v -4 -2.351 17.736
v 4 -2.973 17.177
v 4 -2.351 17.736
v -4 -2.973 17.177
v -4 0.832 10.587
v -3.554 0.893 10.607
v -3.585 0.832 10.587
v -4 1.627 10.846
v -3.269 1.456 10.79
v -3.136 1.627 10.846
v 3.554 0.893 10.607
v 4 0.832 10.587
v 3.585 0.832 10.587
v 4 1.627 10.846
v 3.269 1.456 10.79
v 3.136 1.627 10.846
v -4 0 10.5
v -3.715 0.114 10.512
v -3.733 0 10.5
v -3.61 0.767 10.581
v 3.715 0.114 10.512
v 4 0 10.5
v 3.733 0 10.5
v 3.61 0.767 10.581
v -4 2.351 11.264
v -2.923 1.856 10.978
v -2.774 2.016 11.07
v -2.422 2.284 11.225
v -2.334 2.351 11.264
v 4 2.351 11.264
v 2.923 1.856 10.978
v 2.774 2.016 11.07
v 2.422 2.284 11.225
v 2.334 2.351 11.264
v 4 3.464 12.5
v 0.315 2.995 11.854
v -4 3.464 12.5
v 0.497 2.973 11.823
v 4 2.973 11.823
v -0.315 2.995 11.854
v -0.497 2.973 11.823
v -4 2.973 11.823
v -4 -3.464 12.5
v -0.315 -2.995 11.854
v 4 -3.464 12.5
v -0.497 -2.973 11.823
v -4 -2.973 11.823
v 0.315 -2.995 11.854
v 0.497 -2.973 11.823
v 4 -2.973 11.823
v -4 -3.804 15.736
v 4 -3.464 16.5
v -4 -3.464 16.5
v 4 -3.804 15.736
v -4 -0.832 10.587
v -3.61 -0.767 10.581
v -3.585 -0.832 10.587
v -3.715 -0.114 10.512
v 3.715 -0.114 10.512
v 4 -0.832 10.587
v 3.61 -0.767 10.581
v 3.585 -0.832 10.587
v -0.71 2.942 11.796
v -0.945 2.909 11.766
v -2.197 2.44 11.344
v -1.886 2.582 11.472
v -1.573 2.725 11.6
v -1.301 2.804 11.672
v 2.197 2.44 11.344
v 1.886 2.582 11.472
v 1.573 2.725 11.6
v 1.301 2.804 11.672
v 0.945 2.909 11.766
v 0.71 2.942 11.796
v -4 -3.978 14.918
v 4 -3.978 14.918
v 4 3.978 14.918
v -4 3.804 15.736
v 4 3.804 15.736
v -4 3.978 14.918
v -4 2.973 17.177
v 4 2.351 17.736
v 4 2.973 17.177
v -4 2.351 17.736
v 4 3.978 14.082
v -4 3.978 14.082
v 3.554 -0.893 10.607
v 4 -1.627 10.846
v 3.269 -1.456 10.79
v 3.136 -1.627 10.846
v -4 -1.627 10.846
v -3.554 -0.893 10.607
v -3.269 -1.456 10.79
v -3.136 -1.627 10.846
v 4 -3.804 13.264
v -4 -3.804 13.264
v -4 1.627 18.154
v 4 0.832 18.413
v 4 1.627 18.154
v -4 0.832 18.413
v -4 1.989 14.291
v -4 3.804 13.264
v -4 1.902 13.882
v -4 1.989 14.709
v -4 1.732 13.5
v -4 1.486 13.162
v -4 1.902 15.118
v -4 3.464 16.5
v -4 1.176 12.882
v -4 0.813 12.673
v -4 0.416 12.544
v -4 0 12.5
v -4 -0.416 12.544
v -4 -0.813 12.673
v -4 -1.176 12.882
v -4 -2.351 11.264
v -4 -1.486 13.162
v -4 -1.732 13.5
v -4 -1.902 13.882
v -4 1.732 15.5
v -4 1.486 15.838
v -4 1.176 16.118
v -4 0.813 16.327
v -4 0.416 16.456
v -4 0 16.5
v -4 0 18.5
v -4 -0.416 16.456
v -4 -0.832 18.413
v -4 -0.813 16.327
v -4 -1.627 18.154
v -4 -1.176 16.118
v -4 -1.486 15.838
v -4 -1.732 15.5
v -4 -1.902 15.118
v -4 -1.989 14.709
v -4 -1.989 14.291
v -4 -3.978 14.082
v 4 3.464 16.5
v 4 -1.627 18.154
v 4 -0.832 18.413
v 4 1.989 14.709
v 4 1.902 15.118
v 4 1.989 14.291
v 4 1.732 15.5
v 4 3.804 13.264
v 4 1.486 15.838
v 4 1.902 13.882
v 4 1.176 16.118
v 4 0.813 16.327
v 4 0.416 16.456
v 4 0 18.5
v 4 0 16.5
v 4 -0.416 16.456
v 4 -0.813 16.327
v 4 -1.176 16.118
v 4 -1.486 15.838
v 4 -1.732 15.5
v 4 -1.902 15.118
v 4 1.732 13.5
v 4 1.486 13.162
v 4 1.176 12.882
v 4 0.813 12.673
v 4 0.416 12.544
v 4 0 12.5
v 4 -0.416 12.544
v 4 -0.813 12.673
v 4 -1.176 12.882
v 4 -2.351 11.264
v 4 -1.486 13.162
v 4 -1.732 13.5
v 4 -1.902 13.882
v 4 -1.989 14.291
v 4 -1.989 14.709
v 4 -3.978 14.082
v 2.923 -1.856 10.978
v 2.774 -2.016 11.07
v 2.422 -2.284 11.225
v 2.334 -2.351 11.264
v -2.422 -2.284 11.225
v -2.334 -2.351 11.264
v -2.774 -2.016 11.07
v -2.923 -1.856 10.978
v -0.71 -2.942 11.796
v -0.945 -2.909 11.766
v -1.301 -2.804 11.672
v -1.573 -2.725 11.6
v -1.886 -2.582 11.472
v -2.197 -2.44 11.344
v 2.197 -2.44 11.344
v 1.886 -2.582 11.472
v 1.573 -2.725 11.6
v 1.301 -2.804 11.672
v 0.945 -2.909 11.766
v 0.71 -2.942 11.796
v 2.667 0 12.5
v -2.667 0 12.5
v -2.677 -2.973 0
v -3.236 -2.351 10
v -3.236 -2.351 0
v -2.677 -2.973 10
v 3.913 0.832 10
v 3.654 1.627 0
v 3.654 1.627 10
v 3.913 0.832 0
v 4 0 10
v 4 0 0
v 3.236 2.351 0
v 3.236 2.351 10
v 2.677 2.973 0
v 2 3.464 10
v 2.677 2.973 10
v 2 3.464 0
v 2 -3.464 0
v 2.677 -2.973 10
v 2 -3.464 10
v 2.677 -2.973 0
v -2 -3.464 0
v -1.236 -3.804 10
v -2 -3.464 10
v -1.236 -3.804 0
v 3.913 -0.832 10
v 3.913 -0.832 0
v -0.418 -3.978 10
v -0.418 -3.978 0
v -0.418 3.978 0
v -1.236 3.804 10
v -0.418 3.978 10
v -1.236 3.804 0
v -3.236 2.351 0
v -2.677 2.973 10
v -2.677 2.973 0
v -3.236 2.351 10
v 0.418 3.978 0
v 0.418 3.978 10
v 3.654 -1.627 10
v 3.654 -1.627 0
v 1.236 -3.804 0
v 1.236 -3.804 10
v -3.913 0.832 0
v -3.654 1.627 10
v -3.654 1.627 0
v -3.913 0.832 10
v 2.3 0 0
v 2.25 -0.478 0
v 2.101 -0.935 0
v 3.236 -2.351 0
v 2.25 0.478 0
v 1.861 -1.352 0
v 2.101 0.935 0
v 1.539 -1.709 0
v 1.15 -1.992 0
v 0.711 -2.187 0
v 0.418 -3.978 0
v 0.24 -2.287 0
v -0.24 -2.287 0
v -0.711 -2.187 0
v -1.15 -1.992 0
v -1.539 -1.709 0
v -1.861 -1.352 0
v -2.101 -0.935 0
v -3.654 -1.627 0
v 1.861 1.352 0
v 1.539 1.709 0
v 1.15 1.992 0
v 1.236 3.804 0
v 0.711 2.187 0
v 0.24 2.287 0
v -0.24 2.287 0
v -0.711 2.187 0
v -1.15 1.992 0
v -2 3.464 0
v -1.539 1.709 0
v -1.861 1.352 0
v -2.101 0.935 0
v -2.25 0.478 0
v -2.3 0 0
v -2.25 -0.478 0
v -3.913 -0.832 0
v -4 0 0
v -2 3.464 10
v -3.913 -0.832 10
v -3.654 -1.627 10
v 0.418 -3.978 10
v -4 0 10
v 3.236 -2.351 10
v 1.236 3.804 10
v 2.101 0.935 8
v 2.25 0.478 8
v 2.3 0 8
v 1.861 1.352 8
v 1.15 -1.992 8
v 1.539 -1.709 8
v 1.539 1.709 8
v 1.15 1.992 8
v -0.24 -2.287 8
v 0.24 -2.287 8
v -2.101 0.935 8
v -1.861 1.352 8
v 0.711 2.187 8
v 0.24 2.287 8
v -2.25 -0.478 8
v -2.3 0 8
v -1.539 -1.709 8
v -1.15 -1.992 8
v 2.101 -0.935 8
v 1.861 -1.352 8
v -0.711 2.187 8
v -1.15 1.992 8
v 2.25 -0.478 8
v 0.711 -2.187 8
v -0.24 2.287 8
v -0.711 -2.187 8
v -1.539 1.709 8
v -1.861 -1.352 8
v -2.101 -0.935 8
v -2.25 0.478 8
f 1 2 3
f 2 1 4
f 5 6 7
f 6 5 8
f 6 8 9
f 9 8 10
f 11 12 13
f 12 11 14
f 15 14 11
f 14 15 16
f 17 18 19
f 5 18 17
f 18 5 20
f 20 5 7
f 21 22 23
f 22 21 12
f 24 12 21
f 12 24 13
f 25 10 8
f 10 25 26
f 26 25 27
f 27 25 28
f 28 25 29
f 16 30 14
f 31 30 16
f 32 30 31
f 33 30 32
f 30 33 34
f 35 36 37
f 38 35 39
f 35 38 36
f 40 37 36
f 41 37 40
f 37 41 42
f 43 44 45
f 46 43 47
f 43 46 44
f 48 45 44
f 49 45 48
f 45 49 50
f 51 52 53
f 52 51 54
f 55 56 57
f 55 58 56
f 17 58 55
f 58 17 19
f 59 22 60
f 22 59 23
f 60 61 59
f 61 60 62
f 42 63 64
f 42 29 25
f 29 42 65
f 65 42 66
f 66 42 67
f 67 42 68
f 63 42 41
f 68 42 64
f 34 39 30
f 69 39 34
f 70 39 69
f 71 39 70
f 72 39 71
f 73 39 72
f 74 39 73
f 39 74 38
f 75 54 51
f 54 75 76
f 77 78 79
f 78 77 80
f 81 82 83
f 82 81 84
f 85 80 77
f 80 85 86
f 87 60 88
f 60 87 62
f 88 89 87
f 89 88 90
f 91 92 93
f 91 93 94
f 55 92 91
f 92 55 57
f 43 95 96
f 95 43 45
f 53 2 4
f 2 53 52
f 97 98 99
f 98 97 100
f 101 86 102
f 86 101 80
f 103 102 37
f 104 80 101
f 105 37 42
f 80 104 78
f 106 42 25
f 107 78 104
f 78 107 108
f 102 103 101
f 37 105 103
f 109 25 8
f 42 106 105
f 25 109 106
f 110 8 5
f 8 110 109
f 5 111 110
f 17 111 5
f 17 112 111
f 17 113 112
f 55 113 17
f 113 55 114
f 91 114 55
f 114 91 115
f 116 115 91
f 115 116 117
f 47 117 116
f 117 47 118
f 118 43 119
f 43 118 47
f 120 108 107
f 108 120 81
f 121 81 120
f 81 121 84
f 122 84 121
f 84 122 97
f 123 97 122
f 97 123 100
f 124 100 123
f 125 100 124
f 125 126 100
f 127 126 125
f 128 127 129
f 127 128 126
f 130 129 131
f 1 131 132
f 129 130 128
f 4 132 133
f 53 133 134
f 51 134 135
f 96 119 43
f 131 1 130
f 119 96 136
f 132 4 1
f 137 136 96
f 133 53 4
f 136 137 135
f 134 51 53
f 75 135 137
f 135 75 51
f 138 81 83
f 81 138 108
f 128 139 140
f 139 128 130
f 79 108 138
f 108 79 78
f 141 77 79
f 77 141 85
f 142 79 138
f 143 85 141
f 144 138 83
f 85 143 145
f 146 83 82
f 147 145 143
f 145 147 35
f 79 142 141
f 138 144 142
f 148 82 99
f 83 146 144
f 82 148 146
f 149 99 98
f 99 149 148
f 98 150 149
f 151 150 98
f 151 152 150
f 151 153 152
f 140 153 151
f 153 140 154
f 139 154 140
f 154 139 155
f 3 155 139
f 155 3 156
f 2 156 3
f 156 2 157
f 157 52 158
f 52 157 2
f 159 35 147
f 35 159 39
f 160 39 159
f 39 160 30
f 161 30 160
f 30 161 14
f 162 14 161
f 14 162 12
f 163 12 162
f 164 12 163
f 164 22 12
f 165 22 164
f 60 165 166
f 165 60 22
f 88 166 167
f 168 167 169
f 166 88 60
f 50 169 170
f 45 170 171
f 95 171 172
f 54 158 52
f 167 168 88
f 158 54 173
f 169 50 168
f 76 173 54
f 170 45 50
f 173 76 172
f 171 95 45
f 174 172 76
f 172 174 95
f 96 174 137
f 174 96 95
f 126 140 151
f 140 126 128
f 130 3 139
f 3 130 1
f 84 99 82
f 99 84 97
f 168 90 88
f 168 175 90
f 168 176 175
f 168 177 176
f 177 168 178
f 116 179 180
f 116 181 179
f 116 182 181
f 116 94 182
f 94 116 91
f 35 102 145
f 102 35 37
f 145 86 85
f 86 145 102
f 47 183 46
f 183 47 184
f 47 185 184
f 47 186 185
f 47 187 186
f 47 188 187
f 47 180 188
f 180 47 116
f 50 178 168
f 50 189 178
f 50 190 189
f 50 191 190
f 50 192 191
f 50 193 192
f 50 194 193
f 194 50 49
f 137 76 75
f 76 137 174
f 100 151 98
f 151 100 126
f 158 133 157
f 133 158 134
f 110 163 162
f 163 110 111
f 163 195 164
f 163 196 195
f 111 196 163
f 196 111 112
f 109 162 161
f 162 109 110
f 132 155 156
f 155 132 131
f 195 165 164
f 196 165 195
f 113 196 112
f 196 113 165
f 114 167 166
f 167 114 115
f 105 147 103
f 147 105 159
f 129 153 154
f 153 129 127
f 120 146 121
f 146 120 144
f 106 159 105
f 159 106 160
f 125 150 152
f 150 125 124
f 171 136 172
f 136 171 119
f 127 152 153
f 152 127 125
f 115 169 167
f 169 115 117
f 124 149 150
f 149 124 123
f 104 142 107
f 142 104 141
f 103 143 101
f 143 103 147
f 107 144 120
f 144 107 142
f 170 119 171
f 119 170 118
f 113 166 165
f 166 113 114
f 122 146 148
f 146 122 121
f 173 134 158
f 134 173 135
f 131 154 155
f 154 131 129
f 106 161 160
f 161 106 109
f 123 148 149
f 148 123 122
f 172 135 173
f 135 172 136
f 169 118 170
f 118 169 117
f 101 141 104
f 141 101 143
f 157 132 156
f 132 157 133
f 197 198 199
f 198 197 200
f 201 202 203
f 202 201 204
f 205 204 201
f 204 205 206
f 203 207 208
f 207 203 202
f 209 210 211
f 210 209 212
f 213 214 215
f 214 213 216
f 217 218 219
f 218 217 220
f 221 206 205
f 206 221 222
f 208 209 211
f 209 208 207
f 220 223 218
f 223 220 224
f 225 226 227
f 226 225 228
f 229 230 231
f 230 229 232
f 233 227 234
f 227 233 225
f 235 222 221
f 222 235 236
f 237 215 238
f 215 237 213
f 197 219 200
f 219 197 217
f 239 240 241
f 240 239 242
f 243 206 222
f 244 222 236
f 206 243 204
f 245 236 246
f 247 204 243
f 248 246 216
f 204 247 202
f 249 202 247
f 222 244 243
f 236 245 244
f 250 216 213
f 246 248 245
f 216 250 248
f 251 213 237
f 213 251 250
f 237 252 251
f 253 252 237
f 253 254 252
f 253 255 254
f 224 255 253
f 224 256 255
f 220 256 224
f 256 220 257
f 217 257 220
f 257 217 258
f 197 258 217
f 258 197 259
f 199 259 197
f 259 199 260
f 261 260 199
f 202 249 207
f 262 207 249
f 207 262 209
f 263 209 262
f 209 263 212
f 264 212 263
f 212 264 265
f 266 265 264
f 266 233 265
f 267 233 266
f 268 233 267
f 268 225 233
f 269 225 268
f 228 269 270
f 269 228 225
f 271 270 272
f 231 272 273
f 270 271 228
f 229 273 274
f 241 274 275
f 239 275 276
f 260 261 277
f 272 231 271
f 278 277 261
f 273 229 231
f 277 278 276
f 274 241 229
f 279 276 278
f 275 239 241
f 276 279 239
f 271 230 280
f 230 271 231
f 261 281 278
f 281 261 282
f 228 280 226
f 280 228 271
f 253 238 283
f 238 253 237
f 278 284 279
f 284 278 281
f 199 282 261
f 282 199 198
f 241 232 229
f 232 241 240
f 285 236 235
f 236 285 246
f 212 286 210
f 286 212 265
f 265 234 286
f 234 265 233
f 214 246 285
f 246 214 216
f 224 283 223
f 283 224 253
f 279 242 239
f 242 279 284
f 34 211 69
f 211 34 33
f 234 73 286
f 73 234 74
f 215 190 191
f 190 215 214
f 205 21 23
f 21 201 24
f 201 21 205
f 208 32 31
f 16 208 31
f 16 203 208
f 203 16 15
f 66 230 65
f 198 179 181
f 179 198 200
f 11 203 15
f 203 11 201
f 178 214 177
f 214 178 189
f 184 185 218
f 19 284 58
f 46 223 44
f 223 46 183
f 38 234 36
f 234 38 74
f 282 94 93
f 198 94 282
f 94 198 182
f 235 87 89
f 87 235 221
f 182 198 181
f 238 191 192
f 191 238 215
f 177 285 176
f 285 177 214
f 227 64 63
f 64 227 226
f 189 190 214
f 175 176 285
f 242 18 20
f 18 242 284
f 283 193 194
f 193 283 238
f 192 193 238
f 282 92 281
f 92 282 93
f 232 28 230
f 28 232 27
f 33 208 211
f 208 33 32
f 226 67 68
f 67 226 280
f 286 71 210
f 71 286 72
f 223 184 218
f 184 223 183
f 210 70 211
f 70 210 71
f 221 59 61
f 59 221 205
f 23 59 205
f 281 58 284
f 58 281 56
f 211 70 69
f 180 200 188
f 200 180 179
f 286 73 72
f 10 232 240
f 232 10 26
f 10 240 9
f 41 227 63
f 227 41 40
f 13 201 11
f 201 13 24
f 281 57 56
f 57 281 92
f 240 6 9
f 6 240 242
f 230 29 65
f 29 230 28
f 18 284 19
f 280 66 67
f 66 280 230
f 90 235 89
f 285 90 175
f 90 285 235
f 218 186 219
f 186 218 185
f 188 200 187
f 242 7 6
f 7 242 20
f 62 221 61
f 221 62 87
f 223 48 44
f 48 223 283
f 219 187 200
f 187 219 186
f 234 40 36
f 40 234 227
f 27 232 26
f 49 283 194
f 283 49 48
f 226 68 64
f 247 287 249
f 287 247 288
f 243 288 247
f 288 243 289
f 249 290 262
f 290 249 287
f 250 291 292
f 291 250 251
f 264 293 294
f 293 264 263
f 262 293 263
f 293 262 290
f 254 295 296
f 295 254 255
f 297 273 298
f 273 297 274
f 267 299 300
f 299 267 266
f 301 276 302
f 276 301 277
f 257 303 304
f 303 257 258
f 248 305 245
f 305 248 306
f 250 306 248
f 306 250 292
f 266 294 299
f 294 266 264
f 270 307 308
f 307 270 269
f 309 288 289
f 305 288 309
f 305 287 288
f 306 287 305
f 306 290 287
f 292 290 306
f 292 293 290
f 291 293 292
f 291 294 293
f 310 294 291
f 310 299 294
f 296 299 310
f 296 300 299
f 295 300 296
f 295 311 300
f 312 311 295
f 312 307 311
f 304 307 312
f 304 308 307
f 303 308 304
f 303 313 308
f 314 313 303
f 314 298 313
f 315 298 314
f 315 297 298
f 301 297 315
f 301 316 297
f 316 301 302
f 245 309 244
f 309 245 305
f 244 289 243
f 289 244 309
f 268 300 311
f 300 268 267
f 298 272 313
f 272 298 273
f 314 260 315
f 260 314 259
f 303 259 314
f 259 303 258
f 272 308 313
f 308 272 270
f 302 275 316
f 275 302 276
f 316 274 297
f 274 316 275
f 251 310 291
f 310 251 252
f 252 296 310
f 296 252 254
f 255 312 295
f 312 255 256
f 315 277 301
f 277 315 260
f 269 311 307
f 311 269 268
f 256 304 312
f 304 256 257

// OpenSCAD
$fn=30;

//BEGIN CUSTOMIZER VARIABLES  
/*[Base Setup]*/
//Set tolarance for tightness.  .3 is a good start, bigger the number looser.
RodTolerance = .3;
//in MM.   Radius of connecting rod.
RodRadius = 2;
//in MM.   Socket base height.
RodSocketHeight = 10;
//Depth as a percentage deep for the rod hole. 
RodDepthPercent = .80;  //[.10:.10:.90]
//in MM.   
RodSocketWallThickness = 2;

/*[Eye Hole Setup]*/
//Angle of Eye Hole.  90 is straght up.
EyeAngle = 90;  //[45:5:90]
//in MM.  Center hole radius.
EyeHoleRadius = 2;
//in MM.  Depth of wall around center hole.
EyeWallThickness = 2;
//in MM.  Offset of 0 is a good start.  Lets you slide around the eye.  Used mostly for angled eyes.
EyeOffsetX = 0;
//in MM (up/dn).  Offset of 0 is a good start.  Lets you slide around the eye. Used mostly for angled eyes.
EyeOffsetZ = 0;
/*[Extras]*/
//END CUSTOMIZER VARIABLES


module eye() {
  cAngleOffset = ((90 - EyeAngle)* .06)+EyeOffsetZ;
  echo("cAngleOffset = ", cAngleOffset);
    
  cEyeHeight = ((RodSocketHeight+RodSocketHeight*.25)+EyeWallThickness)-cAngleOffset;
    
  cylinder(h=RodSocketHeight,r=RodRadius+RodSocketWallThickness);
  translate([0,0,RodSocketHeight]) {
    cylinder(h=RodSocketHeight*.25,r1=RodRadius+RodSocketWallThickness, r2=(RodRadius+RodSocketWallThickness)/1.5);
  }

//   translate([-5,0,14]) {
  translate([((RodSocketWallThickness+RodRadius)*-1)+EyeOffsetX,0,cEyeHeight]) {
    rotate(a=EyeAngle, v=[0,1,0]) {
        difference() {
          cylinder(h=(RodRadius+RodSocketWallThickness)*2,r=EyeHoleRadius+EyeWallThickness);
          cylinder(h=(RodRadius+RodSocketWallThickness)*2,r=EyeHoleRadius);
        }
    }
  }
}


difference() {
  eye();
  cylinder(h=RodSocketHeight*RodDepthPercent,r=RodRadius+RodTolerance);  
}
